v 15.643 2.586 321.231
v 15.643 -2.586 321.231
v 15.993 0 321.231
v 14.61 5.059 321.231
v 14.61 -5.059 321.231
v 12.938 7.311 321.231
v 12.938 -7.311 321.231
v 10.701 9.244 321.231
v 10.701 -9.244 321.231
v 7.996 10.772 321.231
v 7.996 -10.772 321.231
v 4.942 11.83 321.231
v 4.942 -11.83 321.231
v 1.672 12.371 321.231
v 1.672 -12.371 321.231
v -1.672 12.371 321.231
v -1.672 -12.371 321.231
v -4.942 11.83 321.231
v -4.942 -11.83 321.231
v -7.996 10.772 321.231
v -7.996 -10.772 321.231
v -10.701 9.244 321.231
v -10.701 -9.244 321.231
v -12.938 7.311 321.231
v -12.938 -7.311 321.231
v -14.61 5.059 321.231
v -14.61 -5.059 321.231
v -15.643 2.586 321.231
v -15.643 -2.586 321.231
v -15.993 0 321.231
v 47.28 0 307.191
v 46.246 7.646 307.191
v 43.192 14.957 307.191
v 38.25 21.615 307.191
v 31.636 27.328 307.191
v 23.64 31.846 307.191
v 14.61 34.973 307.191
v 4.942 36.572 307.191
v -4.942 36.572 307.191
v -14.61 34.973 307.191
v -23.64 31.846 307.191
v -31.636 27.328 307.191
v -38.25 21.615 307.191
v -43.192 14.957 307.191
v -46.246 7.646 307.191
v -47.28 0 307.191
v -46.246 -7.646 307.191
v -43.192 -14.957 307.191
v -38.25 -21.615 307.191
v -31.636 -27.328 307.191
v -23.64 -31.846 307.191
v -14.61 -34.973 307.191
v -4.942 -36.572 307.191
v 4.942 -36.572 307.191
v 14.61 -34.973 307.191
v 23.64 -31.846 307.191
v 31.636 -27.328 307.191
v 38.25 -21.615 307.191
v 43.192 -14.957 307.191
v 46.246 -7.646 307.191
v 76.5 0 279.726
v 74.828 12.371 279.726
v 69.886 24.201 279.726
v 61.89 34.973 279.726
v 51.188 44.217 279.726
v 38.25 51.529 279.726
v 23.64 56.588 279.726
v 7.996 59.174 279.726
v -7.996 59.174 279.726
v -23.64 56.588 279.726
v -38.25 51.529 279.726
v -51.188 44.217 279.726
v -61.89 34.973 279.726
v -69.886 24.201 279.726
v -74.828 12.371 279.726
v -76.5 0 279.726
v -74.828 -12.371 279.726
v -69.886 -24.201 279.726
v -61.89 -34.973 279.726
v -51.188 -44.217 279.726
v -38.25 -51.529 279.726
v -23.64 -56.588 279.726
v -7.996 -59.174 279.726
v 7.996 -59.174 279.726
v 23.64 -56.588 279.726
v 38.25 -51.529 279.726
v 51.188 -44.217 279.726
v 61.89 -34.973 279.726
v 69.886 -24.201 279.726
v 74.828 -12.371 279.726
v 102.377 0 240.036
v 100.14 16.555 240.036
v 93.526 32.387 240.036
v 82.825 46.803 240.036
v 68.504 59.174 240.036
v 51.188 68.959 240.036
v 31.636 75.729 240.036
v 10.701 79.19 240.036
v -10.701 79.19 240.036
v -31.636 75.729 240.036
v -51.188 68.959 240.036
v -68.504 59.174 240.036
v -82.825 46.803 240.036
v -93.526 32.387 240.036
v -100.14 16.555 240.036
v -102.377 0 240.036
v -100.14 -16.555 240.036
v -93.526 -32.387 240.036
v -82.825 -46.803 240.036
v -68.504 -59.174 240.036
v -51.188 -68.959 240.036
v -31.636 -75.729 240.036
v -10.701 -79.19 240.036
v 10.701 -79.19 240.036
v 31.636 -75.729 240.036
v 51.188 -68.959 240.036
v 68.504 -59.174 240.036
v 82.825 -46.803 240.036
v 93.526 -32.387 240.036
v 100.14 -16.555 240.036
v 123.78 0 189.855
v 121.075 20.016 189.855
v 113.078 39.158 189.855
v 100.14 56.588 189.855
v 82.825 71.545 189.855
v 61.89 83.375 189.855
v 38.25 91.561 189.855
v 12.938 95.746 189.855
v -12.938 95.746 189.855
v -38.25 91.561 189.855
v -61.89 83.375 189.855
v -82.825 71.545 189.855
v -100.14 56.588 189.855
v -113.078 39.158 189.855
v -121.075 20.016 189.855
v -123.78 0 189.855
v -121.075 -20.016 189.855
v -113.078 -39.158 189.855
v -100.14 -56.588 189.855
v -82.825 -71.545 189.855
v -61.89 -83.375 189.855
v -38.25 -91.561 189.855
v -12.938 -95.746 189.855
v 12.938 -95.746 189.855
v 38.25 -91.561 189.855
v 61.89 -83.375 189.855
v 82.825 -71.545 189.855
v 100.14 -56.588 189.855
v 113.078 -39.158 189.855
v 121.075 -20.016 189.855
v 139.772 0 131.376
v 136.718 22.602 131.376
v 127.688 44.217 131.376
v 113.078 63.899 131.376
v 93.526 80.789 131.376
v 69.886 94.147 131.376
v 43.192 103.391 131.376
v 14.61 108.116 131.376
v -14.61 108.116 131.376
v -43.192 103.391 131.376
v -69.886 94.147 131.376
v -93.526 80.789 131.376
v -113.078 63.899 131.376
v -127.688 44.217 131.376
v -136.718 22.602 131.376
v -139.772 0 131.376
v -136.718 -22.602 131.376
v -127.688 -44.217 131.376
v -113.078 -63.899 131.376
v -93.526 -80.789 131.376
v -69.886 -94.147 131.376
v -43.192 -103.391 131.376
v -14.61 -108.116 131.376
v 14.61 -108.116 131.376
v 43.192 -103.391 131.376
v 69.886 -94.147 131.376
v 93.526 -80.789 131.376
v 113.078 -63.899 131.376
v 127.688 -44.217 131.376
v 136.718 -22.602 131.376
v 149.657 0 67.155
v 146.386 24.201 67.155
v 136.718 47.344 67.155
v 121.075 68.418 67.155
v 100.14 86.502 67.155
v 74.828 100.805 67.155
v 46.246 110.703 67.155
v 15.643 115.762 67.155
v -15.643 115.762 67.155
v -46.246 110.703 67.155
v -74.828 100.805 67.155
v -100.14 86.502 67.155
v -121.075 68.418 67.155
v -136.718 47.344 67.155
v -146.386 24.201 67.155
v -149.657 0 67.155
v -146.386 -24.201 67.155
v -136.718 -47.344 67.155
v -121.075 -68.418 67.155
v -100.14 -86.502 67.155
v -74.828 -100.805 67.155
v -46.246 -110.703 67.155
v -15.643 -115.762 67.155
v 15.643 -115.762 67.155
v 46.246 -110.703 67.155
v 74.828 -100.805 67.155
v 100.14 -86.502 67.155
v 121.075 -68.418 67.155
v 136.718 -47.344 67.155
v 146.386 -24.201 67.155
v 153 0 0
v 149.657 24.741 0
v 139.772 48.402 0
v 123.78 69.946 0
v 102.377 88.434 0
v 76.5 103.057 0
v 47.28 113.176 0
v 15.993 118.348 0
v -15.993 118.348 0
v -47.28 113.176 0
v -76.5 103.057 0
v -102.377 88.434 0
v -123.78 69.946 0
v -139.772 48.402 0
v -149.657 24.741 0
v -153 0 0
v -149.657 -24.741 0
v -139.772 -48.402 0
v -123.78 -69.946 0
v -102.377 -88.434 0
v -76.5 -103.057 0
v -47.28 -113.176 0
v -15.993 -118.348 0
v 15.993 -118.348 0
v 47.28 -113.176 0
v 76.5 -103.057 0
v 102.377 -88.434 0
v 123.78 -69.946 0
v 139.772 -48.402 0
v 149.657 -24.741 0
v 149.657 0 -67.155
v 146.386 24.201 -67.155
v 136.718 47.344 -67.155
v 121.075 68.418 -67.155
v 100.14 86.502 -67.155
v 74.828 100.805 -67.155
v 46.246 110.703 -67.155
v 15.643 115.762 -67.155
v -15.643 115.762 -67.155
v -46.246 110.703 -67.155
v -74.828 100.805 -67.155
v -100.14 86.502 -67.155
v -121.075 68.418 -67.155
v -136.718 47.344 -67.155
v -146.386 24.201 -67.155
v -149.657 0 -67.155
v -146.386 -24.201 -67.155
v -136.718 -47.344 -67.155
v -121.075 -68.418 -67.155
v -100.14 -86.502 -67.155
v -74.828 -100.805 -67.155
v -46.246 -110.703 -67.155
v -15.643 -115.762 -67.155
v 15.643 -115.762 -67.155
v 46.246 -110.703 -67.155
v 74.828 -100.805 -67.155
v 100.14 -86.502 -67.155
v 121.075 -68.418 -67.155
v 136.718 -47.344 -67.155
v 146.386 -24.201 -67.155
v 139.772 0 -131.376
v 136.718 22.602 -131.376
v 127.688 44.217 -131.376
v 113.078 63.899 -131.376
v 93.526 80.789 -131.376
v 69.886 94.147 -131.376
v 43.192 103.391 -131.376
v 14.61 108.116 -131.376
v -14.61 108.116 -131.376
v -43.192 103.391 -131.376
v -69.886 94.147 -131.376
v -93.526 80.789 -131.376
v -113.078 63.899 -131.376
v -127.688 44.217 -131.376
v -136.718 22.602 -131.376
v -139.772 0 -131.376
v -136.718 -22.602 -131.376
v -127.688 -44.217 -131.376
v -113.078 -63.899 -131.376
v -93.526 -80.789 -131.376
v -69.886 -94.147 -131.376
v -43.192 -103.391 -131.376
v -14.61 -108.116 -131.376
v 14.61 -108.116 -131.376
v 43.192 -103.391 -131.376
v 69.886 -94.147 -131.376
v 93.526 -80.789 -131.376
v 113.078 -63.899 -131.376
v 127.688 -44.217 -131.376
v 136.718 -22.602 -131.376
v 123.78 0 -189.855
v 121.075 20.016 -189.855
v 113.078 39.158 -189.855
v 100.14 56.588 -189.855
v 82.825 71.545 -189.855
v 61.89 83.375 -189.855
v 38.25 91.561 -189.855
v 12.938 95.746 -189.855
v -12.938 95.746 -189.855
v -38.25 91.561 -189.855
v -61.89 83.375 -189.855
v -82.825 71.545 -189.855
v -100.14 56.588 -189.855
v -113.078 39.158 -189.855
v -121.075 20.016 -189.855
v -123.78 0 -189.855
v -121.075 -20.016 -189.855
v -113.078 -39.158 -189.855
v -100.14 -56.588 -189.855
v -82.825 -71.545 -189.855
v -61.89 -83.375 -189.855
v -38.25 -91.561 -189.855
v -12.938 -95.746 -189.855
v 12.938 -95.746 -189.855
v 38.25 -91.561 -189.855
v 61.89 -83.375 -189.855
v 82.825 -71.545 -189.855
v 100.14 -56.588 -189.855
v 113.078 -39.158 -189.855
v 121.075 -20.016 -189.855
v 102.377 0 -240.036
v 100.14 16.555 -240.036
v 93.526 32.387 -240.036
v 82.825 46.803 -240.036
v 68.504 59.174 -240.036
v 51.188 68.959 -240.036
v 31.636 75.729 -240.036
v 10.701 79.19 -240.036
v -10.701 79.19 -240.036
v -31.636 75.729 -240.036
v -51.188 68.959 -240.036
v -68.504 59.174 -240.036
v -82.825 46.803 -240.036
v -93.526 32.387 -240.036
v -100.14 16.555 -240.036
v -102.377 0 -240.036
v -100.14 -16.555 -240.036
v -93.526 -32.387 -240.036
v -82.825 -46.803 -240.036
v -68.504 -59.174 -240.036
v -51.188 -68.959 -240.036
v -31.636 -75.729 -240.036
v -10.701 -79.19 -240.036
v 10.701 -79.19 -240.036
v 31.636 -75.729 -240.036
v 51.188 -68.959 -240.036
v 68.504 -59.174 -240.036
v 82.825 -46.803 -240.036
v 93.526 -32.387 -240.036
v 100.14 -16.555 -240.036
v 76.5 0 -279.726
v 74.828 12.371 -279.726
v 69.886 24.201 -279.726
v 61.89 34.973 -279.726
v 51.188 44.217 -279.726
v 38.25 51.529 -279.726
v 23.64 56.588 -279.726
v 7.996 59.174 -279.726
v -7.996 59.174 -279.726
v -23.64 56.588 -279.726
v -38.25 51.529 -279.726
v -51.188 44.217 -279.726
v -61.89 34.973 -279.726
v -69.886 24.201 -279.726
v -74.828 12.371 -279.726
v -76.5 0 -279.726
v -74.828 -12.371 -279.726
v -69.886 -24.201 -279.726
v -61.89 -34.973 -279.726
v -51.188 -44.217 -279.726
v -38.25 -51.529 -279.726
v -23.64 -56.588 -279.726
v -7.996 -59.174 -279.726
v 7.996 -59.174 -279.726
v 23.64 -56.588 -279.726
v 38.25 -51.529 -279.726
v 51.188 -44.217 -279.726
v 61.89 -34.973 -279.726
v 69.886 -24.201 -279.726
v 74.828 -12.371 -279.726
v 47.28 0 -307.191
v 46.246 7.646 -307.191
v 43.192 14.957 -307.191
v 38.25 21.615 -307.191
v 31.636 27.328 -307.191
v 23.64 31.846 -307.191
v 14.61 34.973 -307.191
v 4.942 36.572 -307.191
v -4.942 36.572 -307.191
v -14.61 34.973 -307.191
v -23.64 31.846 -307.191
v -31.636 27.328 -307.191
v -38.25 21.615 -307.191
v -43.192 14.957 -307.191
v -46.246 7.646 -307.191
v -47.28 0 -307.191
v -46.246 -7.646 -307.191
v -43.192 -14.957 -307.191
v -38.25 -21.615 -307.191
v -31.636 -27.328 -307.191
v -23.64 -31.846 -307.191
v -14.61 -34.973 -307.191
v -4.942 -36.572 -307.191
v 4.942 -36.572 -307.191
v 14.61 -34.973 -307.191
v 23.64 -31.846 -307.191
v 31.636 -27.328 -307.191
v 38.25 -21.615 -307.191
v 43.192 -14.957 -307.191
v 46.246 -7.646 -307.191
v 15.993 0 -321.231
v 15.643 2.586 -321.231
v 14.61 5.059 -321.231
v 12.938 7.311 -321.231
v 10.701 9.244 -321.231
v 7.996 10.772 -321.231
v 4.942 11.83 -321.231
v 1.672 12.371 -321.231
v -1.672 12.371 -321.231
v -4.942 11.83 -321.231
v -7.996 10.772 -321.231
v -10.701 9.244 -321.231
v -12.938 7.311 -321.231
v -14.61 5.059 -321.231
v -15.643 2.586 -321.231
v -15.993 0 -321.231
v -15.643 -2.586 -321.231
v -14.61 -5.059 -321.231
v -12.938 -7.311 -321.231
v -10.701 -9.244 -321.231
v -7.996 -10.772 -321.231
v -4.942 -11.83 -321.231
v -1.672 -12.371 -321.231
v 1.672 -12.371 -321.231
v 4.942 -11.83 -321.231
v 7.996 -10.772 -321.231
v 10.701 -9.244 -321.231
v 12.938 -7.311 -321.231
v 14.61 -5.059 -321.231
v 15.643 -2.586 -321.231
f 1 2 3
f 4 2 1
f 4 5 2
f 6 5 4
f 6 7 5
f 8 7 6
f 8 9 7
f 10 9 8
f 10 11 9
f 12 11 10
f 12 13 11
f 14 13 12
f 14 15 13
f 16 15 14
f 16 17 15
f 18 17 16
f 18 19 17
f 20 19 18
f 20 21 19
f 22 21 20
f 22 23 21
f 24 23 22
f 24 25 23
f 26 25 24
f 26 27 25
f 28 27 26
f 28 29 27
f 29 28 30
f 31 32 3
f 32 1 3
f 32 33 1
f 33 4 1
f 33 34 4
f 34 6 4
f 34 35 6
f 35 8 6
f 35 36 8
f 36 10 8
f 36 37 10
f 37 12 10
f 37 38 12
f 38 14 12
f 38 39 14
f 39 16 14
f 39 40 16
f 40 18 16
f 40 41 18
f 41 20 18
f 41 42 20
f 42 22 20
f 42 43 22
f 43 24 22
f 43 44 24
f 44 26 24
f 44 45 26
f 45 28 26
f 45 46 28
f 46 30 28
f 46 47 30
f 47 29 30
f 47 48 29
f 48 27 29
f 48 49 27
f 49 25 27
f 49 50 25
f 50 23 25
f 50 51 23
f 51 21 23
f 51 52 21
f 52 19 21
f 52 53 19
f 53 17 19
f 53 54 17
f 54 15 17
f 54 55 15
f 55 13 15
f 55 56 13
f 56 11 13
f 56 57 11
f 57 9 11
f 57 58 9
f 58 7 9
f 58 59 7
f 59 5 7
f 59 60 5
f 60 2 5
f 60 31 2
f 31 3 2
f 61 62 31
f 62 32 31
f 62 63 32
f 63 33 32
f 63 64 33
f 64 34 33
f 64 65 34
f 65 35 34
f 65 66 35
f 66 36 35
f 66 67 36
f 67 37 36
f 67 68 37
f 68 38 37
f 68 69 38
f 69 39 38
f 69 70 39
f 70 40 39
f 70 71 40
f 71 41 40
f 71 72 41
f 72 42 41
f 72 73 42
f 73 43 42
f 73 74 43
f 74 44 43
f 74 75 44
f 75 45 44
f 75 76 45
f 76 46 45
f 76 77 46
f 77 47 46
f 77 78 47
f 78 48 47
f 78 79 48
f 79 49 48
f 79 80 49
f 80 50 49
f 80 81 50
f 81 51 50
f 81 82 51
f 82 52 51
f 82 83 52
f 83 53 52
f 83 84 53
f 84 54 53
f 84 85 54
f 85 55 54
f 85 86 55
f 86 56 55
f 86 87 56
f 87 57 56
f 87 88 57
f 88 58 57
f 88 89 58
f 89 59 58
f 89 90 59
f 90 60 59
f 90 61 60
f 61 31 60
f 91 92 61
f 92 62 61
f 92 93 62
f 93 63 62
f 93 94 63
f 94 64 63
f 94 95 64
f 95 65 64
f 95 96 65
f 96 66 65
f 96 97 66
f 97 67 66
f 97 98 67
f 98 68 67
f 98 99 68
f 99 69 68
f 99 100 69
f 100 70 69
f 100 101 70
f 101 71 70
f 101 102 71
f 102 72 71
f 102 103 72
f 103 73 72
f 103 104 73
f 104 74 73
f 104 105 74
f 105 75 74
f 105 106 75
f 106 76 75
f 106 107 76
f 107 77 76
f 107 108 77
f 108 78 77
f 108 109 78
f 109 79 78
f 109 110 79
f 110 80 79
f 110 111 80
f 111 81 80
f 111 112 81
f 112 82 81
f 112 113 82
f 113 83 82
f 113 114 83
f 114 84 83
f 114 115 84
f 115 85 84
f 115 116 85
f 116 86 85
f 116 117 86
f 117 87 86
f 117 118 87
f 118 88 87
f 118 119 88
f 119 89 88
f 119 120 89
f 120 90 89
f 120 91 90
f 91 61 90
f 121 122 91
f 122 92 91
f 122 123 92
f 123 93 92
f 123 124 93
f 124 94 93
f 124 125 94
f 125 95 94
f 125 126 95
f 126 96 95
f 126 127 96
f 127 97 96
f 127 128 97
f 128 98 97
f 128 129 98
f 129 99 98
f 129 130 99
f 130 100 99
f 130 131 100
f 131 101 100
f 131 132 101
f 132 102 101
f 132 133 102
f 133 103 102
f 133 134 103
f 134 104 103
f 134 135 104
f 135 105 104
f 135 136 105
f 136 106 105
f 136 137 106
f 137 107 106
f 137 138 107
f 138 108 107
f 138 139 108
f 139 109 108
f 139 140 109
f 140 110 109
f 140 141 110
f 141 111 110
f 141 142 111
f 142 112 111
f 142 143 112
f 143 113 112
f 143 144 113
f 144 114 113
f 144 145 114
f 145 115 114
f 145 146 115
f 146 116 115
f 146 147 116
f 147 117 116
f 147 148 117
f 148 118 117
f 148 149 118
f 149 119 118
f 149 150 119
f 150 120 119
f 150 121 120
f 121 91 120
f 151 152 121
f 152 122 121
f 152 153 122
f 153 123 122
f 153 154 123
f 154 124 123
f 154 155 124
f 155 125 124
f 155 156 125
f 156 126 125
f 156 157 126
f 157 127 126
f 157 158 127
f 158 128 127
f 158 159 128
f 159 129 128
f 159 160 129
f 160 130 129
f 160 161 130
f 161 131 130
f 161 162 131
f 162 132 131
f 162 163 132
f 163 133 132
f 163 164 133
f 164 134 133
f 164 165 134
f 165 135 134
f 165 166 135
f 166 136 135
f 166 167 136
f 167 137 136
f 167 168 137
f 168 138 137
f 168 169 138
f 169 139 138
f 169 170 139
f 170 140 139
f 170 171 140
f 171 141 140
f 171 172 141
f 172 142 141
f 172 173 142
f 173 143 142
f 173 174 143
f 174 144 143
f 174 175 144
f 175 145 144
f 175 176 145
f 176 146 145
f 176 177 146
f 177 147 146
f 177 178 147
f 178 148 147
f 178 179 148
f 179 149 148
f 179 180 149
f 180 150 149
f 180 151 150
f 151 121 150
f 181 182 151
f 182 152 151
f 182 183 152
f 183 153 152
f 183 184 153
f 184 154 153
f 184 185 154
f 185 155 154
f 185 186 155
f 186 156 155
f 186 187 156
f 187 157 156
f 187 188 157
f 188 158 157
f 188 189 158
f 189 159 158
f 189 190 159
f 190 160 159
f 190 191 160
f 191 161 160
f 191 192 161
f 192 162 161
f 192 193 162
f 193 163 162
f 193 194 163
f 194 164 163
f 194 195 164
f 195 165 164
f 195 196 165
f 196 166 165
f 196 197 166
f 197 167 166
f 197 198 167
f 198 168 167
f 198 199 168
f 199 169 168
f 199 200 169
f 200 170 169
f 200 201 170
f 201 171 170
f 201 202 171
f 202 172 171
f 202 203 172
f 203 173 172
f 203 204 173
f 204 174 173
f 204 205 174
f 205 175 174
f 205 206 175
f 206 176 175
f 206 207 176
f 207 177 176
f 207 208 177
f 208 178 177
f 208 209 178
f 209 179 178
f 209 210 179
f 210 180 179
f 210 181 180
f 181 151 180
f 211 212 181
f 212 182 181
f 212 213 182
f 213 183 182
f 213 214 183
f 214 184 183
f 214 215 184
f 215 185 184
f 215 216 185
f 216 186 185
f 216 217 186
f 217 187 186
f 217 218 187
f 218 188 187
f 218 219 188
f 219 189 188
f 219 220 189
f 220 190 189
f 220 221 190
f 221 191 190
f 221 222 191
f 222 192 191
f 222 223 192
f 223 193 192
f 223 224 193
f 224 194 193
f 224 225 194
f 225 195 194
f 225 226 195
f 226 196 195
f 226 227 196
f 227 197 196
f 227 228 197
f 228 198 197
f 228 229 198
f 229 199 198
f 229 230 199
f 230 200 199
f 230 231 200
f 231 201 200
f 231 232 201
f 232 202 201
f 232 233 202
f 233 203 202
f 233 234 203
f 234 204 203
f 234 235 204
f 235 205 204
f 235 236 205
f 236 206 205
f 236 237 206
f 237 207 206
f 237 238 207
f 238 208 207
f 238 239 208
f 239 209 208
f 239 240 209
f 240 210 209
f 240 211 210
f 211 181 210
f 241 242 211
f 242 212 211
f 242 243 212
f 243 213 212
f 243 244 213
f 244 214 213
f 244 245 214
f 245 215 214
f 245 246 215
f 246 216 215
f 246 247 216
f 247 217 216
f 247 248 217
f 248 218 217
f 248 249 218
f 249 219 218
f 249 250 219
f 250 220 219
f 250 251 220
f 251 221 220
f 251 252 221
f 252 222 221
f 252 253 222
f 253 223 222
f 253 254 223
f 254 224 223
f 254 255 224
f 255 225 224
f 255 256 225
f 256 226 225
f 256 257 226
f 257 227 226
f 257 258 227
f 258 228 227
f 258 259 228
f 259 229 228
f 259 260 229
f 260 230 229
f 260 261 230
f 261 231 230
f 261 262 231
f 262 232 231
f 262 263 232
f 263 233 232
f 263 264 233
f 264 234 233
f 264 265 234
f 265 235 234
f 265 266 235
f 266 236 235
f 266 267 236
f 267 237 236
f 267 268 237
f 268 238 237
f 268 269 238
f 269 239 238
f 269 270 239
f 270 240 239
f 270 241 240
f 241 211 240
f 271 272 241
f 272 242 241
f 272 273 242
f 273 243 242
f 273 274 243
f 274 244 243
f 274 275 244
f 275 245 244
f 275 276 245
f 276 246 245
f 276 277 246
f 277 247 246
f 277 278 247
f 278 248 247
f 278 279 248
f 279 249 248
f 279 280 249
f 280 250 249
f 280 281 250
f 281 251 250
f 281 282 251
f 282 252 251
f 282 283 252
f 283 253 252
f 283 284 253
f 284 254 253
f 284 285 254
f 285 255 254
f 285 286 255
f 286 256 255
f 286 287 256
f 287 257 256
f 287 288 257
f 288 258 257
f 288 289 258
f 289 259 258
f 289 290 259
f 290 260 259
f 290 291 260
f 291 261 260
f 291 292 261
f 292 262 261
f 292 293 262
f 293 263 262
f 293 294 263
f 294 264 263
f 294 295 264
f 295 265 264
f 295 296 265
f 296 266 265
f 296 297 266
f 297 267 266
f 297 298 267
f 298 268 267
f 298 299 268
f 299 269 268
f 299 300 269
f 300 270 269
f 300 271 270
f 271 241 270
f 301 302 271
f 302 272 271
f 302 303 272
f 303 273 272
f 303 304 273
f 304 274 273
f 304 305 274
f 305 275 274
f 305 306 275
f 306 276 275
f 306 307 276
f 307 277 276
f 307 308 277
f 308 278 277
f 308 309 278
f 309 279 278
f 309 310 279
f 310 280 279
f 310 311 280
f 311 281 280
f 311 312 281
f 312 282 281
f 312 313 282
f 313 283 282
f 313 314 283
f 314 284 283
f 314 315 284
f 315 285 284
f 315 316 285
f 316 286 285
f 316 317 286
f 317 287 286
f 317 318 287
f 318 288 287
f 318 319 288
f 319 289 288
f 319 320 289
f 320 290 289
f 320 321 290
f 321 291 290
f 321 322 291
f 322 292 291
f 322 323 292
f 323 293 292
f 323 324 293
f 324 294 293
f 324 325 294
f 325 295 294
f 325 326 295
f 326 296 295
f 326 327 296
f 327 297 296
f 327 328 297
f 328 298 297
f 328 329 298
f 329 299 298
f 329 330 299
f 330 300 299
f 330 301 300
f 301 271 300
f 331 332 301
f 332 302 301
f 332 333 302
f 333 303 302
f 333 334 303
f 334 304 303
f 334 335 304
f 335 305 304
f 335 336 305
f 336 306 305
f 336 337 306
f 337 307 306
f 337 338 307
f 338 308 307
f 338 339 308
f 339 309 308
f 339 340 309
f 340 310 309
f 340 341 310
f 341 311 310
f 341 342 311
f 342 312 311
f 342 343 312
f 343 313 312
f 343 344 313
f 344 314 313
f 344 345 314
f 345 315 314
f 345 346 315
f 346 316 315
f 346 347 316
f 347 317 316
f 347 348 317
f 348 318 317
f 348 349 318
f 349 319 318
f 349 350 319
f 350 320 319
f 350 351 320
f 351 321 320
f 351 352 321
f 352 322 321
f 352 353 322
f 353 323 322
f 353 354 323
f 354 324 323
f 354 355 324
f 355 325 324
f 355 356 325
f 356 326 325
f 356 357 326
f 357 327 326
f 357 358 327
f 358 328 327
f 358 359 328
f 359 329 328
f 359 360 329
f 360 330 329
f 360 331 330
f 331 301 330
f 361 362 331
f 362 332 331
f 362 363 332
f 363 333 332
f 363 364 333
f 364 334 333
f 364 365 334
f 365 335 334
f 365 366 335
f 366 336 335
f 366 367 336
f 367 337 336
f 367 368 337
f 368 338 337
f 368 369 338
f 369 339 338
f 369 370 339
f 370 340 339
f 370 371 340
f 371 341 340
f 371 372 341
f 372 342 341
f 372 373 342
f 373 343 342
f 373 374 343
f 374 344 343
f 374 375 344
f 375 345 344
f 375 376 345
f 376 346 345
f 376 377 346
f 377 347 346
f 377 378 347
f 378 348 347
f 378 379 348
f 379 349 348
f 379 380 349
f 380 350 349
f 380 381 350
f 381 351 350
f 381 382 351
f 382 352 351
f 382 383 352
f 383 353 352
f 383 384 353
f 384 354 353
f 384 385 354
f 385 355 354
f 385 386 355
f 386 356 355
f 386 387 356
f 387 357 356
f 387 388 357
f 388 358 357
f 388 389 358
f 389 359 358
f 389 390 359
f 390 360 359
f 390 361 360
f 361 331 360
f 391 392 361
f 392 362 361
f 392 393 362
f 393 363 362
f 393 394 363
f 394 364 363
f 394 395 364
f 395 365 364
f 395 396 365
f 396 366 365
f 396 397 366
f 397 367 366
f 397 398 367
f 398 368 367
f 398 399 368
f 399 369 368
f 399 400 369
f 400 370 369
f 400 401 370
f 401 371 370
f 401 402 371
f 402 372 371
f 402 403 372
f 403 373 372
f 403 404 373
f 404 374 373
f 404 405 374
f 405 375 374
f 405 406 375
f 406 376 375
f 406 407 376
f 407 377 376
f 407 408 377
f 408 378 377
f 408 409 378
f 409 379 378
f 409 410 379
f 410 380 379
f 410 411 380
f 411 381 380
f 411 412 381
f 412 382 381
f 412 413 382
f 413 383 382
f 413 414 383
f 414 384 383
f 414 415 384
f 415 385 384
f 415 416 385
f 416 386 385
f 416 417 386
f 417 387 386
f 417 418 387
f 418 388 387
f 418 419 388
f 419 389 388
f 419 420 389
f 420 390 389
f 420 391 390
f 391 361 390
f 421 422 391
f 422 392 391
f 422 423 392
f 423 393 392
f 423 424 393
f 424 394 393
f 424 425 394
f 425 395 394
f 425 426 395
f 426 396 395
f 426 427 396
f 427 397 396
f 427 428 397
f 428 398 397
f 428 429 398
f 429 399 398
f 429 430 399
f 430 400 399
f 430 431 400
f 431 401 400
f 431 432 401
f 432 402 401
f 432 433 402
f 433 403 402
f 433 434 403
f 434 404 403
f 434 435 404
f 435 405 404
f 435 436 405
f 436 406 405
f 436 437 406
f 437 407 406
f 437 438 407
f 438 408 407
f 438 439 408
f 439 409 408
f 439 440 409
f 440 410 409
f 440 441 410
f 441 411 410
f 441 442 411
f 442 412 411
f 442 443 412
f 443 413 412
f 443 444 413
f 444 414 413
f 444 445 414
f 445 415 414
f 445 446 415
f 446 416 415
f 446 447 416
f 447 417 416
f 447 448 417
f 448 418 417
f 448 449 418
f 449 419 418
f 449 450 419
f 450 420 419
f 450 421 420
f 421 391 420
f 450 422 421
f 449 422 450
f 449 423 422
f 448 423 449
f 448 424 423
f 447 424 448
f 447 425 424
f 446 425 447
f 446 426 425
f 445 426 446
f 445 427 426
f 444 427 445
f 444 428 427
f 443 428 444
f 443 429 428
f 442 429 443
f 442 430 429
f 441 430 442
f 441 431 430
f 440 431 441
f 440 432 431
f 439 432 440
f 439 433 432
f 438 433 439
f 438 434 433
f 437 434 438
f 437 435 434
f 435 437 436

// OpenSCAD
// Generated by SolidPython 1.0.1 on 2020-07-29 00:46:48


scale(v = [9, 7, 19]) {
	sphere(r = 17);
}
/***********************************************
*********      SolidPython code:      **********
************************************************
 
# import packages: SolidPython
from solid import *
from solid.utils import *
from itertools import chain, combinations, permutations


class Resize:

    def __init__(self, scad_file):
        self.scad_file = scad_file
        #self.scad_file = import_scad(scad_file)
        # cone/cylinder param:
        self.r1 = 0
        self.r2 = 0
        self.h = 0
        # rectangular prism param:
        self.w = 0
        self.l = 0
        # ellipse param:
        self.r = 0

    # import OpenScad code (file name corresponds to shape)


    # classify shape + parameters
    def assign(self, param1, param2, param3):
        if self.scad_file == 'cone.scad':
            self.r1 = param1
            self.r2 = param2
            self.h = param3
        elif self.scad_file == 'cylinder.scad':
            self.r1 = param1
            self.r2 = param2
            self.h = param3
        elif self.scad_file == 'rectangularPrism.scad':
            self.h = param1
            self.l = param2
            self.w = param3
        else:
            self.r = param1
            self.h = param2

    # resize parameters
    def iterate(self):
        x = range(3, 20, 2)
        i = 1
        if self.scad_file == 'cone.scad':
            tempList = list(permutations(x, 2))
            for temp in tempList:
                param1 = temp[0]
                param2 = temp[1]
                filepath = 'produced_scad_files/' + 'cone' + str(param1) + '_' + str(param2) + '_' + '.scad'
                scad_render_to_file(cylinder(h=param1, r1=param2, r2=0), filepath)

        elif self.scad_file == 'cylinder.scad':
            tempList = list(permutations(x, 3))
            for temp in tempList:
                param1 = temp[0]
                param2 = temp[1]
                filepath = 'produced_scad_files/' + 'cylinder' + str(param1) + '_' + str(param2) + '_' + '.scad'
                scad_render_to_file(cylinder(h=param1, r1=param2, r2=param2), filepath)

        elif self.scad_file == 'rectangularPrism.scad':
            tempList = list(permutations(x, 3))
            for temp in tempList:
                param1 = temp[0]
                param2 = temp[1]
                param3 = temp[2]
                filepath = 'produced_scad_files/' + 'rectangularPrism' + str(param1) + '_' + str(param2) + '_' + str(
                    param3) + '.scad'
                scad_render_to_file(cube(size=(param1, param2, param3)), filepath)

        elif self.scad_file == 'ellipse.scad':
            tempList = list(permutations(x, 4))
            for temp in tempList:
                param1 = temp[0]
                param2 = temp[1]
                param3 = temp[2]
                param4 = temp[3]
                filepath = 'produced_scad_files/' + 'ellipse' + str(param1) + '_' + str(param2) + '_' + str(param3) + '_' + str(param4) + '.scad'
                scad_render_to_file(scale([param1, param2, param3])(sphere(r=param4)), filepath)

    def render_to_scadfile(self):
        scad_render_to_file(scad, 'example.scad') 
 
************************************************/
